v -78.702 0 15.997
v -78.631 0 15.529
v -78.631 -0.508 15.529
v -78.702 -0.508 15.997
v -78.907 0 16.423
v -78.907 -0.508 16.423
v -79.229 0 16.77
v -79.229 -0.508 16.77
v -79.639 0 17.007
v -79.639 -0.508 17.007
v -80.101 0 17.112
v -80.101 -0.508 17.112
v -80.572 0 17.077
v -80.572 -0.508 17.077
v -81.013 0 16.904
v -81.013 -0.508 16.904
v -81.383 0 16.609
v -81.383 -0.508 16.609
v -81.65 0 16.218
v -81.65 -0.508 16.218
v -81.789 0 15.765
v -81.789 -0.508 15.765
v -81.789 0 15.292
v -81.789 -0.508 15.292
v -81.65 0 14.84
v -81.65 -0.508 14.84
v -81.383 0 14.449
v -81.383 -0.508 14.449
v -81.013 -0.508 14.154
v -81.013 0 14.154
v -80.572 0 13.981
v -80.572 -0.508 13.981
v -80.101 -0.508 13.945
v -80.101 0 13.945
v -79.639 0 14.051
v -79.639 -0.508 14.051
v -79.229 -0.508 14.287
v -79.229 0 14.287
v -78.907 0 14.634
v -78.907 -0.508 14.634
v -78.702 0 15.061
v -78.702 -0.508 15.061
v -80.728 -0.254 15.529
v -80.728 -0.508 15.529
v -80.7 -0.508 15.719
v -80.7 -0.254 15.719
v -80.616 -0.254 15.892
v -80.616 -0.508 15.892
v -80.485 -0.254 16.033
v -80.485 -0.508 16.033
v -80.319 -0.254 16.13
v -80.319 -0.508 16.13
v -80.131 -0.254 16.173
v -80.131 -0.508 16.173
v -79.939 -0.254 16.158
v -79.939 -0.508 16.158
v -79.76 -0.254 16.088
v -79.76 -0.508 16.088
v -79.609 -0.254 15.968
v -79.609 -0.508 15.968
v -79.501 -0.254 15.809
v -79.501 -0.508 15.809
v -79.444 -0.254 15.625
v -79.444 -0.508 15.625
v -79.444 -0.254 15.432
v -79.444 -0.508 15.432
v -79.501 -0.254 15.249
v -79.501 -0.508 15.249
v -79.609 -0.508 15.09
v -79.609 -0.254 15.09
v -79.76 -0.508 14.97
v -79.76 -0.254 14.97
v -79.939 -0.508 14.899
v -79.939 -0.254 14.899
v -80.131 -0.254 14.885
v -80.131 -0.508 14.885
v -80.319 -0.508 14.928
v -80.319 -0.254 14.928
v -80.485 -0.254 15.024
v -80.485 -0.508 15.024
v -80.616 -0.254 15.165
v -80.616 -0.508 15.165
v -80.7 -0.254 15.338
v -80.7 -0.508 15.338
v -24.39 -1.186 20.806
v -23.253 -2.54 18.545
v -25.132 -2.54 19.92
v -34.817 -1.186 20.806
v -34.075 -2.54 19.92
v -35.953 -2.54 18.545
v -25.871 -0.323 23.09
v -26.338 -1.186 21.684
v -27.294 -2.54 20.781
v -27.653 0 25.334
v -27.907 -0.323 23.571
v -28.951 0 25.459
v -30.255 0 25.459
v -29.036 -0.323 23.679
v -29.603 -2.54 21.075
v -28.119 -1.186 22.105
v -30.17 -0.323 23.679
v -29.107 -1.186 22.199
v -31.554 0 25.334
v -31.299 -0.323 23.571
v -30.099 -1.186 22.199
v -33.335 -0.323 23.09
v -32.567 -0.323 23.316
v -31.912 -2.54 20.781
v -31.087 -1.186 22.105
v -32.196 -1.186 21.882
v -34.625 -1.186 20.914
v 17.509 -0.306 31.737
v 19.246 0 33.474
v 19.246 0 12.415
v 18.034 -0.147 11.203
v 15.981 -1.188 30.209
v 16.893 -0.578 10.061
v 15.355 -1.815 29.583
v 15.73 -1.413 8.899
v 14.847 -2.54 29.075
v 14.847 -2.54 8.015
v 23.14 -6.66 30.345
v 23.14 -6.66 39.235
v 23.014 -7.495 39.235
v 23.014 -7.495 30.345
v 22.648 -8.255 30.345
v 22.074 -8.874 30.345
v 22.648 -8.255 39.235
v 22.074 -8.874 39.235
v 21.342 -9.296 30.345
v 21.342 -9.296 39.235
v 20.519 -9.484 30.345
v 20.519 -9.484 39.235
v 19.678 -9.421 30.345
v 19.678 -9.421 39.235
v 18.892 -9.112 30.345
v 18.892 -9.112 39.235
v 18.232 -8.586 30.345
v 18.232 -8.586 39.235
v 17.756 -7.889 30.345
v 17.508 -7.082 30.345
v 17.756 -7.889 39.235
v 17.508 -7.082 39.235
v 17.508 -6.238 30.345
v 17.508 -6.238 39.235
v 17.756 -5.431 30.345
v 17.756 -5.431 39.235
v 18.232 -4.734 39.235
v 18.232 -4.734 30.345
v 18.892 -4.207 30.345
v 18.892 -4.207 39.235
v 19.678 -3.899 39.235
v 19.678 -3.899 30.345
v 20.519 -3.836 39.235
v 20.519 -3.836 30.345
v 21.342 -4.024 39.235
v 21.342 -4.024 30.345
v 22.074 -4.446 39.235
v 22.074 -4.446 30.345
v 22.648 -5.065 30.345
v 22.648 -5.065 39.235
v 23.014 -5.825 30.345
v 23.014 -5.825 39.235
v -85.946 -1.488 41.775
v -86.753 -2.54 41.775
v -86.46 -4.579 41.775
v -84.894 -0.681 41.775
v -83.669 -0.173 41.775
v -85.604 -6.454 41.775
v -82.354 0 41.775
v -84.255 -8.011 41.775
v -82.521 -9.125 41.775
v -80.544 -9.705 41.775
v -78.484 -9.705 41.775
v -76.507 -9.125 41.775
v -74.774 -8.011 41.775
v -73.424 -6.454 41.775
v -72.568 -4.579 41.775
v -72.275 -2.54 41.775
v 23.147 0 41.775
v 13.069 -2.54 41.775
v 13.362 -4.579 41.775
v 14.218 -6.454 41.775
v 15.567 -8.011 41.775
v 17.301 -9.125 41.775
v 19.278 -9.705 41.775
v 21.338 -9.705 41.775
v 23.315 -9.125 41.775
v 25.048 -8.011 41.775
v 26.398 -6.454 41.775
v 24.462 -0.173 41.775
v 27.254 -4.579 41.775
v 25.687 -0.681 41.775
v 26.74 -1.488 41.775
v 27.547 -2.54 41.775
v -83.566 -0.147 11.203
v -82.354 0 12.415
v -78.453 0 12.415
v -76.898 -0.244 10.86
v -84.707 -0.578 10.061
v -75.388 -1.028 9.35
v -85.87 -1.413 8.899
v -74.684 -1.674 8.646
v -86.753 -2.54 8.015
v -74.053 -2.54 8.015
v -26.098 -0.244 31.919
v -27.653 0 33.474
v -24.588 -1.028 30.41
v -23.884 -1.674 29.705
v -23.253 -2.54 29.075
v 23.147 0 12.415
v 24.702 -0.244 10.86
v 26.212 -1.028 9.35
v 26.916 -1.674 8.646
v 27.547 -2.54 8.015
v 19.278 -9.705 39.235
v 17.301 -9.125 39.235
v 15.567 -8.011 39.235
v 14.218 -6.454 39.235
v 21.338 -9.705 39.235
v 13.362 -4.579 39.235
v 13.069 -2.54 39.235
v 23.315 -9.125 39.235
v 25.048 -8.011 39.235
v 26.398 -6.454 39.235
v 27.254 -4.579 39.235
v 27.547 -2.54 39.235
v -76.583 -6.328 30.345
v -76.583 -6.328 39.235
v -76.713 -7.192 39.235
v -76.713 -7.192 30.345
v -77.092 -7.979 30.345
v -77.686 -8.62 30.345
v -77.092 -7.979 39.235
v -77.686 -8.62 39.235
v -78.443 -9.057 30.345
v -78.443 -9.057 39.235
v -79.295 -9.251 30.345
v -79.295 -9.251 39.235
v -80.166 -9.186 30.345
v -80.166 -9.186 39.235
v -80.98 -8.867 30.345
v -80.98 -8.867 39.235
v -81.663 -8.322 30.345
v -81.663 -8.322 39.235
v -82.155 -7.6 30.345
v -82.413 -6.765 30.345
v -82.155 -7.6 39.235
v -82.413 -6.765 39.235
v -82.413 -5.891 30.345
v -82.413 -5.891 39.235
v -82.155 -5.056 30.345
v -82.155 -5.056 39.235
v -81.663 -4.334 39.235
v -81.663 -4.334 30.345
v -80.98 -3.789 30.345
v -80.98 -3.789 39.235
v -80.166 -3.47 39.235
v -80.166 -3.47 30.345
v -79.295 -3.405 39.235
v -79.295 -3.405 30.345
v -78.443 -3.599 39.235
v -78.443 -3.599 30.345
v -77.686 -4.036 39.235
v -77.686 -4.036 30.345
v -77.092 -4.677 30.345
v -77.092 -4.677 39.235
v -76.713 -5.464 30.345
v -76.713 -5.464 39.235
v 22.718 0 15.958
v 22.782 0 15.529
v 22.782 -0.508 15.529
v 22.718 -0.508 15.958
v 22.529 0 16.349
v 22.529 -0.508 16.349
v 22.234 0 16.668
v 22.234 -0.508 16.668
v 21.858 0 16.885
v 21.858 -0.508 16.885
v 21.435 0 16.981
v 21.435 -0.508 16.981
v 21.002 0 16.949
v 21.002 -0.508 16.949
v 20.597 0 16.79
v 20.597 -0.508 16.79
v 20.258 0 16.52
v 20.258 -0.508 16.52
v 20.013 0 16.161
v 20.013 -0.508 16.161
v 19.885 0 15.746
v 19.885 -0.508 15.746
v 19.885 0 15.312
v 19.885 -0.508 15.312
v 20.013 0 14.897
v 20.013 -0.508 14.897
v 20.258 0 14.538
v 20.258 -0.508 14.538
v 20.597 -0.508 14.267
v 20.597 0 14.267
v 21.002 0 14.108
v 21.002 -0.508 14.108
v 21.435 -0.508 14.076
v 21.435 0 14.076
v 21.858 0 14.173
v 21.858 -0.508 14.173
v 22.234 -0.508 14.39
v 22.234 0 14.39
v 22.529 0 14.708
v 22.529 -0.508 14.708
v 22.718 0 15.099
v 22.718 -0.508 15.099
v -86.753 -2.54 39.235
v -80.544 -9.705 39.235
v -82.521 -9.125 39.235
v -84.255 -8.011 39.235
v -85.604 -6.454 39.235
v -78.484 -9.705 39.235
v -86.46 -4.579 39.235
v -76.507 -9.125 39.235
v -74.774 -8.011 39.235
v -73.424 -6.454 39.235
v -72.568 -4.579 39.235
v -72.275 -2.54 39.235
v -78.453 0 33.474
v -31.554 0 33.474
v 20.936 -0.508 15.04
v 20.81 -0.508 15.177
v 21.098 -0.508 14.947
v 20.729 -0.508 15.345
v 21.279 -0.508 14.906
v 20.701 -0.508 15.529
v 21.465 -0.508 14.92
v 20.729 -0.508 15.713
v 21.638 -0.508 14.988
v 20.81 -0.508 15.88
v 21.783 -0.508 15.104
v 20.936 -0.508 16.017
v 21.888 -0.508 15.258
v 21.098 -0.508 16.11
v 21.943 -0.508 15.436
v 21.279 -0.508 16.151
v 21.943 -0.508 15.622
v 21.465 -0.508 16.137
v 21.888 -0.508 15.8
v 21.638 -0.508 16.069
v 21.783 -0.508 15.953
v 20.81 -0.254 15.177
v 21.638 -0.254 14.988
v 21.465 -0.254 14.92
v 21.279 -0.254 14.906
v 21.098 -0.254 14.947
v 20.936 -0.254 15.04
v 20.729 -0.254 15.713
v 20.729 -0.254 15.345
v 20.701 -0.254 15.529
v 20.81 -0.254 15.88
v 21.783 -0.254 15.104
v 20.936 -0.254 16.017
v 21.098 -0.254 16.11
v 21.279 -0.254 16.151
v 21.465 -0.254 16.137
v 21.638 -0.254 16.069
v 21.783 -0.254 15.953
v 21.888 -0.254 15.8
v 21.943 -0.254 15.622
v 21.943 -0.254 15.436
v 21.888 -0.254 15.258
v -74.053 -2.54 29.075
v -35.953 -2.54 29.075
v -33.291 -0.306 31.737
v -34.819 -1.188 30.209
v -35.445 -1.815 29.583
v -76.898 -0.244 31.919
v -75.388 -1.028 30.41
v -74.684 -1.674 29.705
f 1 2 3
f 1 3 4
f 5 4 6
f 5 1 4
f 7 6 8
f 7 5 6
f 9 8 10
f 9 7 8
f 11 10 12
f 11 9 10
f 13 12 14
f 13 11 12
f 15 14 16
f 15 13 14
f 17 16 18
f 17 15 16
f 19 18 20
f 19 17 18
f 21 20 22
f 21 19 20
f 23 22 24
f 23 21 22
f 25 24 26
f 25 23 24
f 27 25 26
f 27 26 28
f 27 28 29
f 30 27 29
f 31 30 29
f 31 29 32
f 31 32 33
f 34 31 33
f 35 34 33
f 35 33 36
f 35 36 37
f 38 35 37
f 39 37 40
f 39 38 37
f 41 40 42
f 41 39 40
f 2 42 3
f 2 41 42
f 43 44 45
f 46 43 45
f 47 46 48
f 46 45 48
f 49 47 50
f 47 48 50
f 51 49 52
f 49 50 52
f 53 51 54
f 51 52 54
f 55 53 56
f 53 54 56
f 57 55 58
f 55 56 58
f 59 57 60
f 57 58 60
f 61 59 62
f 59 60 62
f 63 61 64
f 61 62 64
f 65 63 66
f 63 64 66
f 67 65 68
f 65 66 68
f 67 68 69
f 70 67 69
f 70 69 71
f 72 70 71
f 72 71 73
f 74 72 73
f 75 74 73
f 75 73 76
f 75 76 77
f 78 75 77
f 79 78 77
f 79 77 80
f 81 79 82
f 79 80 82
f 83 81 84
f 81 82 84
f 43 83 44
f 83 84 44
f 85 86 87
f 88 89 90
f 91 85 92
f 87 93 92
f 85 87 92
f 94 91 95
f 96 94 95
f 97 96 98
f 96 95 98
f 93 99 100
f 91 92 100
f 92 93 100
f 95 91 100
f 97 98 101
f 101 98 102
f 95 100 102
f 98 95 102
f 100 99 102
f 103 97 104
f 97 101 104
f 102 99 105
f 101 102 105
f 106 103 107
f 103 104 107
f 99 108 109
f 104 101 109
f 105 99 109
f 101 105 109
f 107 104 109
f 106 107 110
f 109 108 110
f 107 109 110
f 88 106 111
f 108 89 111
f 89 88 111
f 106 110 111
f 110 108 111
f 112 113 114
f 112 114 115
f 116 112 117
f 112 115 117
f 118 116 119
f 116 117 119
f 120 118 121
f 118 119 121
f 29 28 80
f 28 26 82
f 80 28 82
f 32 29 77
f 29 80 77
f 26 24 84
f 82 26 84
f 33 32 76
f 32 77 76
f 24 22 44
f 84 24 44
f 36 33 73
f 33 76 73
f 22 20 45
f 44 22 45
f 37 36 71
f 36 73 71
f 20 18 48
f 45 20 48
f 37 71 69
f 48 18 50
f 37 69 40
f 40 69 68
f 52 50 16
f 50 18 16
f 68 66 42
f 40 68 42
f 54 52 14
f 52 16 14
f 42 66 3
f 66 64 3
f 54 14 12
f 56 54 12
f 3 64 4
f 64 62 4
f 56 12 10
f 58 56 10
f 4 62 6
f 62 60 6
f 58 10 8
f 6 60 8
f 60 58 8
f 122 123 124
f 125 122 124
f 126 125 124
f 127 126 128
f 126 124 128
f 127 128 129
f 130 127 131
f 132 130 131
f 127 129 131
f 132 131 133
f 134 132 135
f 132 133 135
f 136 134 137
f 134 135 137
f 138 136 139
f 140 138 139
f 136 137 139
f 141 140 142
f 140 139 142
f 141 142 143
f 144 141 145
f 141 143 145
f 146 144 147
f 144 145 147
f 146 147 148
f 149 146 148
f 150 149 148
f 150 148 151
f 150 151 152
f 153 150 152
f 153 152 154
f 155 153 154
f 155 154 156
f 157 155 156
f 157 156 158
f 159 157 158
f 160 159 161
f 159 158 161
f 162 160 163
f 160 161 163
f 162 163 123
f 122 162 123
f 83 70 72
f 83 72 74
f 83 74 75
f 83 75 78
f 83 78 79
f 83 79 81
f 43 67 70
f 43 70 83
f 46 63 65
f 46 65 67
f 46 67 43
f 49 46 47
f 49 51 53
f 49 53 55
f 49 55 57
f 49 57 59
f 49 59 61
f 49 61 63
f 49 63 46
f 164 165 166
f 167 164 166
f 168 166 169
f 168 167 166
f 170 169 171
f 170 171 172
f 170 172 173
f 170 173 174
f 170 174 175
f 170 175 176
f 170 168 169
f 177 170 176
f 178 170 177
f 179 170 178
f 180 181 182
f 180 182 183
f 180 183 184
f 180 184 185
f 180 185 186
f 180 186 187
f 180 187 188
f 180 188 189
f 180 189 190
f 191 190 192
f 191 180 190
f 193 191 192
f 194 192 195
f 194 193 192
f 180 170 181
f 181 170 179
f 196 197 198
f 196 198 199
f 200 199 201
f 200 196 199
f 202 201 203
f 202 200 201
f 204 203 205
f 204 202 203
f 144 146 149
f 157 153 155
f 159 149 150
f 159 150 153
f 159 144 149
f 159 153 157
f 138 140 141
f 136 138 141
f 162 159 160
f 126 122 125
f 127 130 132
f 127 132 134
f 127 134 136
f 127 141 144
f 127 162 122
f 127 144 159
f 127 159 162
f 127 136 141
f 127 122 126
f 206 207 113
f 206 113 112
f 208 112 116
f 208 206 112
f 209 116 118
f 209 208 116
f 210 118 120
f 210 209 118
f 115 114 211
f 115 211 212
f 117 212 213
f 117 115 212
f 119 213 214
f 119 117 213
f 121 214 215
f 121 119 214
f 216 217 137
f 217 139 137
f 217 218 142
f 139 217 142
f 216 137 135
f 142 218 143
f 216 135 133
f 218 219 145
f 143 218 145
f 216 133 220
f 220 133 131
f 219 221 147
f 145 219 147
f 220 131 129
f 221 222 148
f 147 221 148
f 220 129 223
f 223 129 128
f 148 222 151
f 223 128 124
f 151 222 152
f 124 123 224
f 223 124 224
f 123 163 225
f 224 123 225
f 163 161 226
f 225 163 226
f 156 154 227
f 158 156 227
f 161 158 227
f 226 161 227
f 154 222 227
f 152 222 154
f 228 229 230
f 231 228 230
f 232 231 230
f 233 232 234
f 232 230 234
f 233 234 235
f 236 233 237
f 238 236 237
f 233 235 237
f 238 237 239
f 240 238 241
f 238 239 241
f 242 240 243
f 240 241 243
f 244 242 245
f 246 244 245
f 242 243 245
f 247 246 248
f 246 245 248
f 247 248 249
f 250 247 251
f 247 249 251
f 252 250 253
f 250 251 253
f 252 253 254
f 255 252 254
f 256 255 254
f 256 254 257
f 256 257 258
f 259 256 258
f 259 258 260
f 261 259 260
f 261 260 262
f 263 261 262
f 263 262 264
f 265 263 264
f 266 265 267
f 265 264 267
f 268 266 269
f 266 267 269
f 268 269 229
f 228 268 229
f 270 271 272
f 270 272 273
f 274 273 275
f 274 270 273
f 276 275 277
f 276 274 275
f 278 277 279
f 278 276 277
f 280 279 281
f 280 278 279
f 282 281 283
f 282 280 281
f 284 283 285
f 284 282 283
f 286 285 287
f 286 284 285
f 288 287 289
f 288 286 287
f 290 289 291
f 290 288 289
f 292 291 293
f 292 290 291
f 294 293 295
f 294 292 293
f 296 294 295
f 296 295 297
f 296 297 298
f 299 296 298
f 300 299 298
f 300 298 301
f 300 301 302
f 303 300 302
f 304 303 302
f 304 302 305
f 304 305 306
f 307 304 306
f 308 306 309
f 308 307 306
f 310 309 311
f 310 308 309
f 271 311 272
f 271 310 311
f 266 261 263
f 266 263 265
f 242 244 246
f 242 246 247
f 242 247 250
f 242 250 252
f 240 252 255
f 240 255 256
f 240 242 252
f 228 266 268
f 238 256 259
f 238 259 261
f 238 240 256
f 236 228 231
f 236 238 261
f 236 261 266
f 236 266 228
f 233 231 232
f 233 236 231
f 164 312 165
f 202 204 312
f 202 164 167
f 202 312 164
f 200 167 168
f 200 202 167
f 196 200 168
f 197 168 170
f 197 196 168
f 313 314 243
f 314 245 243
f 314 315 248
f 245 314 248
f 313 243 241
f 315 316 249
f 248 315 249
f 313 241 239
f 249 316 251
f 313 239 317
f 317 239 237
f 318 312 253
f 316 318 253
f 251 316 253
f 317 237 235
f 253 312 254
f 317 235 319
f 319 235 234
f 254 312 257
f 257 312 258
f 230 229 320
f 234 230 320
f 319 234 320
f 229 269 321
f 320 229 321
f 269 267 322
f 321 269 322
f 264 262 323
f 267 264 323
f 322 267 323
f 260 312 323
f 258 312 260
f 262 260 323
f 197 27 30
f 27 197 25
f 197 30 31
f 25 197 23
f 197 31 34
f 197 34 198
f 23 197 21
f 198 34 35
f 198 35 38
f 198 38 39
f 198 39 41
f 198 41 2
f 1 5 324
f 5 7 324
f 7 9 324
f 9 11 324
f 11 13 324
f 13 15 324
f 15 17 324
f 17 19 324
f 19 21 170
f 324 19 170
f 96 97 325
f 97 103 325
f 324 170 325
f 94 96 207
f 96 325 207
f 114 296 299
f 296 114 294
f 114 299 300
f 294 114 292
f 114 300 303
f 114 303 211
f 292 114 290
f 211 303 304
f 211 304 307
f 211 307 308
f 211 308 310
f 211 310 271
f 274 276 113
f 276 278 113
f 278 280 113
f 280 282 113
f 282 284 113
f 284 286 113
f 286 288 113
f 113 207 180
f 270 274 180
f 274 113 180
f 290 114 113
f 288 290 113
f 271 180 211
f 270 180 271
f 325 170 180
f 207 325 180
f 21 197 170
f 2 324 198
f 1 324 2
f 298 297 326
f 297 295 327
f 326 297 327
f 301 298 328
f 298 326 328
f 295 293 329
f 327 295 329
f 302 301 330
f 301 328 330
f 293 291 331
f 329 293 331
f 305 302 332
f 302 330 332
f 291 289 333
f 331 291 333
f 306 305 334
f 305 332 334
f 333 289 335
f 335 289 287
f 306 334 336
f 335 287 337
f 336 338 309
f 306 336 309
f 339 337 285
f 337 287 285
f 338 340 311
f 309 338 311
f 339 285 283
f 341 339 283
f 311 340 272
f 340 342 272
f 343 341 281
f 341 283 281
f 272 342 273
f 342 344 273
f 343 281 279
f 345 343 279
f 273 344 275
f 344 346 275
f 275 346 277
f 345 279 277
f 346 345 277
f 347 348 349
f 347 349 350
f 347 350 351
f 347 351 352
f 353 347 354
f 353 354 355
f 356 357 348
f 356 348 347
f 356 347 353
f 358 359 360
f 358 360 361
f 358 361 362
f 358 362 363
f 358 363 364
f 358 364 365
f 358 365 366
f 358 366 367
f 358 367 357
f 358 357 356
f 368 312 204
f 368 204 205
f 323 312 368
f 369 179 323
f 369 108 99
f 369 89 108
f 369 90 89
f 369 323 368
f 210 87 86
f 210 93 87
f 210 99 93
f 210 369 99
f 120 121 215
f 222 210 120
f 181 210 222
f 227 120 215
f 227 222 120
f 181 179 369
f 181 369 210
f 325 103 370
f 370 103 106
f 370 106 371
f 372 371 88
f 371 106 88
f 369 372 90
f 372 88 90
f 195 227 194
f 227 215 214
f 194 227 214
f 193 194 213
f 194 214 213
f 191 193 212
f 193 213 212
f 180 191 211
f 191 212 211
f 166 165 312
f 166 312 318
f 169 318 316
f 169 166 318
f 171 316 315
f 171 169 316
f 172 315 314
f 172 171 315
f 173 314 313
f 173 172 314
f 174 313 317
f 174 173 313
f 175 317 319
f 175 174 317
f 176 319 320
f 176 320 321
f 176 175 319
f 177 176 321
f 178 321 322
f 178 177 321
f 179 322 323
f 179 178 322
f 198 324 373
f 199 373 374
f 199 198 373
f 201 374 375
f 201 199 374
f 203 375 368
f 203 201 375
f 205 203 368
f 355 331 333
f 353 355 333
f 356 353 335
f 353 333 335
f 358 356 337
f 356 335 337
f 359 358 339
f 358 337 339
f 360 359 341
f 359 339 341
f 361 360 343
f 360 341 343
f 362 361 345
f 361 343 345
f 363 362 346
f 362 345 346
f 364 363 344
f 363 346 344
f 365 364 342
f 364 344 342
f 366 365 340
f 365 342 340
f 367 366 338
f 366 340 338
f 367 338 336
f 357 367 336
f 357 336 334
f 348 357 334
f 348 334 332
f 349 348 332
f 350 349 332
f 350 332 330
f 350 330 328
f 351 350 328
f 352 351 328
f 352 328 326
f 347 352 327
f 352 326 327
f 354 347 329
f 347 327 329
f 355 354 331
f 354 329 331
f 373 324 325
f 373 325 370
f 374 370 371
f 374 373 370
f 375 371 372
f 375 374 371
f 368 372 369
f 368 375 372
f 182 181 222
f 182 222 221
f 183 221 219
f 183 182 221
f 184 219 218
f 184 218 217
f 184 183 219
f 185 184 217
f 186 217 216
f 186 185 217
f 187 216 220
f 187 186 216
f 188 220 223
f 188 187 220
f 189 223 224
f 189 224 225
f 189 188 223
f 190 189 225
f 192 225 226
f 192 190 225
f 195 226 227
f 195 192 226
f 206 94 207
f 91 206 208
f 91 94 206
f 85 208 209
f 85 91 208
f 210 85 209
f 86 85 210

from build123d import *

# Parameters (mm, degrees)
F1_DEPTH     = 2.54
F3_DEPTH     = 2.54
F4_R         = 2.9314454593
F5_R         = 2.8319389427
F6_DEPTH     = 8.89
F8_DEPTH     = 25.4
F9_T1_DEPTH  = 38.1
F9_T3_DEPTH  = 38.1
F9_T5_DEPTH  = 21.5282681004
F9_T7_DEPTH  = 32.0580135728
F9_T9_DEPTH  = 55.7565362009
F9_T11_DEPTH = 34.6970452561
F9_T13_DEPTH = 34.6970452561
F9_T16_ANGLE = 223.4050528115
F9_T21_DEPTH = 49.0985226281
F9_T25_DEPTH = 32.5267907285
F9_T32_DEPTH = 32.0580135728
F9_T37_DEPTH = 49.0985226281
F9_T44_DEPTH = 49.0985226281
F9_T48_DEPTH = 32.0580135728
F9_T56_DEPTH = 32.5267907285
F9_T60_DEPTH = 49.0985226281
F10_R        = 1.4567648878
F10_R_2      = 1.5876943873
F11_DEPTH    = 0.508
F12_R        = 0.6244535606
F12_R_2      = 0.645662674
F13_DEPTH    = 0.254


# Not quite as in the source:
# - a fillet or chamfer that OpenCascade refuses, or shapes differently, is made with other operations: its cross-section is extruded or revolved along the edge and cut away or added


with BuildPart() as f1:
    # F0 (on Front) → F1 (new body)
    with BuildSketch(Plane.XZ):
        Polygon((27.5468391635, 41.7749450469), (-86.7531608365, 41.7749450469), (-86.7531608365, 8.0154541022), (-74.0531608365, 8.0154541022), (-74.0531608365, 29.0749450469), (-35.9531608365, 29.0749450469), (-35.9531608365, 8.0154541022), (-23.2531608365, 8.0154541022), (-23.2531608365, 29.0749450469), (14.8468391635, 29.0749450469), (14.8468391635, 8.0154541022), (27.5468391635, 8.0154541022), align=None)
    extrude(amount=F1_DEPTH)

    # F2 (on face) → F3 (join)
    with BuildSketch(Plane.XY.offset(41.7749450469)):
        with BuildLine():
            Line((27.5468391635, -2.54), (13.0688391635, -2.54))
            ThreePointArc((13.0688391635, -2.54), (20.3078391635, -9.779), (27.5468391635, -2.54))
        make_face()
        with BuildLine():
            Line((-72.2751608365, -2.54), (-86.7531608365, -2.54))
            ThreePointArc((-86.7531608365, -2.54), (-79.5141608365, -9.779), (-72.2751608365, -2.54))
        make_face()
    extrude(amount=-F3_DEPTH)

    # F4 (on face) + F5 (on face) → F6 (join)
    with BuildSketch(Plane(origin=(0, 0, 39.2349450469), x_dir=(1, 0, 0), z_dir=(0, 0, -1))):
        with Locations((-79.5141608365, 6.3278437592)):
            Circle(F4_R)
    with BuildSketch(Plane(origin=(0, 0, 39.2349450469), x_dir=(1, 0, 0), z_dir=(0, 0, -1))):
        with Locations((20.3078391635, 6.6598863341)):
            Circle(F5_R)
    extrude(amount=F6_DEPTH)

    # F7 (on face) → F8 (cut)
    with BuildSketch(Plane.XZ.offset(2.54)):
        with BuildLine():
            Line((-23.2531608365, 8.0154541022), (-23.2531608365, 18.5451995745))
            ThreePointArc((-23.2531608365, 18.5451995745), (-29.6031608365, 21.0747577819), (-35.9531608365, 18.5451995745))
            Line((-35.9531608365, 18.5451995745), (-35.9531608365, 8.0154541022))
            Line((-35.9531608365, 8.0154541022), (-23.2531608365, 8.0154541022))
        make_face()
    extrude(amount=-F8_DEPTH, mode=Mode.SUBTRACT)

    # F9: fillet of radius 5.08 on 11 edges, made by hand

    # F9_s2 → F9_t1 (cut)
    with BuildSketch(Plane.YZ.offset(-23.2531608365)):
        with BuildLine():
            ThreePointArc((0, 33.4743540981), (-0.6805909488, 30.9343540981), (-2.54, 29.0749450469))
            Line((-2.54, 29.0749450469), (0, 29.0749450469))
            Line((0, 29.0749450469), (0, 33.4743540981))
        make_face()
    extrude(amount=F9_T1_DEPTH, mode=Mode.SUBTRACT)

    # F9_s4 → F9_t3 (cut)
    with BuildSketch(Plane.YZ.offset(-74.0531608365)):
        with BuildLine():
            ThreePointArc((0, 33.4743540981), (-0.6805909488, 30.9343540981), (-2.54, 29.0749450469))
            Line((-2.54, 29.0749450469), (0, 29.0749450469))
            Line((0, 29.0749450469), (0, 33.4743540981))
        make_face()
    extrude(amount=F9_T3_DEPTH, mode=Mode.SUBTRACT)

    # F9_s6 → F9_t5 (cut)
    with BuildSketch(Plane.XY.offset(7.5466769465)):
        with BuildLine():
            ThreePointArc((-31.5537517853, 0), (-34.0937517853, -0.6805909488), (-35.9531608365, -2.54))
            Line((-35.9531608365, -2.54), (-35.9531608365, 0))
            Line((-35.9531608365, 0), (-31.5537517853, 0))
        make_face()
        with BuildLine():
            ThreePointArc((-27.6525698878, 0), (-25.1125698878, -0.6805909488), (-23.2531608365, -2.54))
            Line((-23.2531608365, -2.54), (-23.2531608365, 0))
            Line((-23.2531608365, 0), (-27.6525698878, 0))
        make_face()
    extrude(amount=F9_T5_DEPTH, mode=Mode.SUBTRACT)

    # F9_s8 → F9_t7 (cut)
    with BuildSketch(Plane.XY.offset(-2.9830685259)):
        with BuildLine():
            ThreePointArc((19.2462482147, 0), (16.7062482147, -0.6805909488), (14.8468391635, -2.54))
            Line((14.8468391635, -2.54), (14.8468391635, 0))
            Line((14.8468391635, 0), (19.2462482147, 0))
        make_face()
        with BuildLine():
            ThreePointArc((-78.4525698878, 0), (-75.9125698878, -0.6805909488), (-74.0531608365, -2.54))
            Line((-74.0531608365, -2.54), (-74.0531608365, 0))
            Line((-74.0531608365, 0), (-78.4525698878, 0))
        make_face()
    extrude(amount=F9_T7_DEPTH, mode=Mode.SUBTRACT)

    # F9_s10 → F9_t9 (cut)
    with BuildSketch(Plane.XY.offset(-2.9830685259)):
        with BuildLine():
            ThreePointArc((27.5468391635, -2.54), (25.6874301122, -0.6805909488), (23.1474301122, 0))
            Line((23.1474301122, 0), (27.5468391635, 0))
            Line((27.5468391635, 0), (27.5468391635, -2.54))
        make_face()
        with BuildLine():
            ThreePointArc((-86.7531608365, -2.54), (-84.8937517853, -0.6805909488), (-82.3537517853, 0))
            Line((-82.3537517853, 0), (-86.7531608365, 0))
            Line((-86.7531608365, 0), (-86.7531608365, -2.54))
        make_face()
    extrude(amount=F9_T9_DEPTH, mode=Mode.SUBTRACT)

    # F9_s12 → F9_t11 (cut)
    with BuildSketch(Plane.YZ.offset(-97.7516834646)):
        with BuildLine():
            ThreePointArc((0, 12.4148631534), (-0.6805909488, 9.8748631534), (-2.54, 8.0154541022))
            Line((-2.54, 8.0154541022), (0, 8.0154541022))
            Line((0, 8.0154541022), (0, 12.4148631534))
        make_face()
    extrude(amount=F9_T11_DEPTH, mode=Mode.SUBTRACT)

    # F9_s14 → F9_t13 (cut)
    with BuildSketch(Plane.YZ.offset(3.8483165354)):
        with BuildLine():
            ThreePointArc((0, 12.4148631534), (-0.6805909488, 9.8748631534), (-2.54, 8.0154541022))
            Line((-2.54, 8.0154541022), (0, 8.0154541022))
            Line((0, 8.0154541022), (0, 12.4148631534))
        make_face()
    extrude(amount=F9_T13_DEPTH, mode=Mode.SUBTRACT)

    # F9_s15 → F9_t16 (revolve, cut)
    with BuildSketch(Plane(origin=(0.0198149882, 0, 0.0497864763), x_dir=(0, 1, 0), z_dir=(-0.3697877262, 0, -0.929116267))):
        with BuildLine():
            ThreePointArc((0, -18.2485055237), (-0.6805909488, -20.7885055237), (-2.54, -22.6479145749))
            Line((-2.54, -22.6479145749), (0, -22.6479145749))
            Line((0, -22.6479145749), (0, -18.2485055237))
        make_face()
    revolve(axis=Axis((-29.6031608365, 0, 11.8397133801), (0, -1, 0)), revolution_arc=F9_T16_ANGLE, mode=Mode.SUBTRACT)


with BuildPart() as f9_tool19:
    # F9_s20 → F9_t21 (new body)
    with BuildSketch(Plane.YZ.offset(-34.2516834646)):
        with BuildLine():
            ThreePointArc((0, 33.4743540981), (-0.6805909488, 30.9343540981), (-2.54, 29.0749450469))
            Line((-2.54, 29.0749450469), (0, 29.0749450469))
            Line((0, 29.0749450469), (0, 33.4743540981))
        make_face()
    extrude(amount=F9_T21_DEPTH)

    split(bisect_by=Plane.YZ.offset(-23.2531608365), keep=Keep.BOTTOM)


with BuildPart() as f9_tool23:
    # F9_s24 → F9_t25 (new body)
    with BuildSketch(Plane.XY.offset(7.5466769465)):
        with BuildLine():
            ThreePointArc((-27.6525698878, 0), (-25.1125698878, -0.6805909488), (-23.2531608365, -2.54))
            Line((-23.2531608365, -2.54), (-23.2531608365, 0))
            Line((-23.2531608365, 0), (-27.6525698878, 0))
        make_face()
    extrude(amount=F9_T25_DEPTH)

    split(bisect_by=Plane.XY.offset(29.0749450469), keep=Keep.TOP)


with BuildPart() as f9_tool19_1:
    add(f9_tool19.part)

    # F9_t27: intersect F9_tool23
    add(f9_tool23.part, mode=Mode.INTERSECT)


with BuildPart() as f1_1:
    add(f1.part)

    # F9_t17: cut F9_tool19
    add(f9_tool19_1.part, mode=Mode.SUBTRACT)


with BuildPart() as f9_tool30:
    # F9_s31 → F9_t32 (new body)
    with BuildSketch(Plane.XY.offset(40.073467675)):
        with BuildLine():
            ThreePointArc((19.2462482147, 0), (16.7062482147, -0.6805909488), (14.8468391635, -2.54))
            Line((14.8468391635, -2.54), (14.8468391635, 0))
            Line((14.8468391635, 0), (19.2462482147, 0))
        make_face()
    extrude(amount=-F9_T32_DEPTH)

    split(bisect_by=Plane.XY.offset(39.2349450469), keep=Keep.BOTTOM)

    split(bisect_by=Plane.XY.offset(29.0749450469), keep=Keep.TOP)


with BuildPart() as f9_tool35:
    # F9_s36 → F9_t37 (new body)
    with BuildSketch(Plane.YZ.offset(-23.2531608365)):
        with BuildLine():
            ThreePointArc((0, 33.4743540981), (-0.6805909488, 30.9343540981), (-2.54, 29.0749450469))
            Line((-2.54, 29.0749450469), (0, 29.0749450469))
            Line((0, 29.0749450469), (0, 33.4743540981))
        make_face()
    extrude(amount=F9_T37_DEPTH)

    split(bisect_by=Plane.YZ.offset(14.8468391635), keep=Keep.TOP)


with BuildPart() as f9_tool30_1:
    add(f9_tool30.part)

    # F9_t39: intersect F9_tool35
    add(f9_tool35.part, mode=Mode.INTERSECT)


with BuildPart() as f1_2:
    add(f1_1.part)

    # F9_t28: cut F9_tool30
    add(f9_tool30_1.part, mode=Mode.SUBTRACT)


with BuildPart() as f9_tool42:
    # F9_s43 → F9_t44 (new body)
    with BuildSketch(Plane.YZ.offset(-85.0516834646)):
        with BuildLine():
            ThreePointArc((0, 33.4743540981), (-0.6805909488, 30.9343540981), (-2.54, 29.0749450469))
            Line((-2.54, 29.0749450469), (0, 29.0749450469))
            Line((0, 29.0749450469), (0, 33.4743540981))
        make_face()
    extrude(amount=F9_T44_DEPTH)

    split(bisect_by=Plane.YZ.offset(-74.0531608365), keep=Keep.BOTTOM)


with BuildPart() as f9_tool46:
    # F9_s47 → F9_t48 (new body)
    with BuildSketch(Plane.XY.offset(8.0154541022)):
        with BuildLine():
            ThreePointArc((-78.4525698878, 0), (-75.9125698878, -0.6805909488), (-74.0531608365, -2.54))
            Line((-74.0531608365, -2.54), (-74.0531608365, 0))
            Line((-74.0531608365, 0), (-78.4525698878, 0))
        make_face()
    extrude(amount=F9_T48_DEPTH)

    split(bisect_by=Plane.XY.offset(29.0749450469), keep=Keep.TOP)

    split(bisect_by=Plane.XY.offset(39.2349450469), keep=Keep.BOTTOM)


with BuildPart() as f9_tool42_1:
    add(f9_tool42.part)

    # F9_t51: intersect F9_tool46
    add(f9_tool46.part, mode=Mode.INTERSECT)


with BuildPart() as f1_3:
    add(f1_2.part)

    # F9_t40: cut F9_tool42
    add(f9_tool42_1.part, mode=Mode.SUBTRACT)


with BuildPart() as f9_tool54:
    # F9_s55 → F9_t56 (new body)
    with BuildSketch(Plane.XY.offset(40.073467675)):
        with BuildLine():
            ThreePointArc((-31.5537517853, 0), (-34.0937517853, -0.6805909488), (-35.9531608365, -2.54))
            Line((-35.9531608365, -2.54), (-35.9531608365, 0))
            Line((-35.9531608365, 0), (-31.5537517853, 0))
        make_face()
    extrude(amount=-F9_T56_DEPTH)

    split(bisect_by=Plane.XY.offset(29.0749450469), keep=Keep.TOP)


with BuildPart() as f9_tool58:
    # F9_s59 → F9_t60 (new body)
    with BuildSketch(Plane.YZ.offset(-74.0531608365)):
        with BuildLine():
            ThreePointArc((0, 33.4743540981), (-0.6805909488, 30.9343540981), (-2.54, 29.0749450469))
            Line((-2.54, 29.0749450469), (0, 29.0749450469))
            Line((0, 29.0749450469), (0, 33.4743540981))
        make_face()
    extrude(amount=F9_T60_DEPTH)

    split(bisect_by=Plane.YZ.offset(-35.9531608365), keep=Keep.TOP)


with BuildPart() as f9_tool54_1:
    add(f9_tool54.part)

    # F9_t62: intersect F9_tool58
    add(f9_tool58.part, mode=Mode.INTERSECT)


with BuildPart() as f1_4:
    add(f1_3.part)

    # F9_t52: cut F9_tool54
    add(f9_tool54_1.part, mode=Mode.SUBTRACT)

    # F10 (on Front) → F11 (cut)
    with BuildSketch(Plane.XZ):
        with Locations((21.32573165, 15.5286919326)):
            Circle(F10_R)
        with Locations((-80.219194293, 15.5286919326)):
            Circle(F10_R_2)
    extrude(amount=F11_DEPTH, mode=Mode.SUBTRACT)

    # F12 (on face) → F13 (join)
    with BuildSketch(Plane(origin=(0, -0.508, 0), x_dir=(-1, 0, 0), z_dir=(0, 1, 0))):
        with Locations((-21.32573165, 15.5286919326)):
            Circle(F12_R)
        with Locations((80.0827890635, 15.5286919326)):
            Circle(F12_R_2)
    extrude(amount=F13_DEPTH)


solid = f1_4.part
